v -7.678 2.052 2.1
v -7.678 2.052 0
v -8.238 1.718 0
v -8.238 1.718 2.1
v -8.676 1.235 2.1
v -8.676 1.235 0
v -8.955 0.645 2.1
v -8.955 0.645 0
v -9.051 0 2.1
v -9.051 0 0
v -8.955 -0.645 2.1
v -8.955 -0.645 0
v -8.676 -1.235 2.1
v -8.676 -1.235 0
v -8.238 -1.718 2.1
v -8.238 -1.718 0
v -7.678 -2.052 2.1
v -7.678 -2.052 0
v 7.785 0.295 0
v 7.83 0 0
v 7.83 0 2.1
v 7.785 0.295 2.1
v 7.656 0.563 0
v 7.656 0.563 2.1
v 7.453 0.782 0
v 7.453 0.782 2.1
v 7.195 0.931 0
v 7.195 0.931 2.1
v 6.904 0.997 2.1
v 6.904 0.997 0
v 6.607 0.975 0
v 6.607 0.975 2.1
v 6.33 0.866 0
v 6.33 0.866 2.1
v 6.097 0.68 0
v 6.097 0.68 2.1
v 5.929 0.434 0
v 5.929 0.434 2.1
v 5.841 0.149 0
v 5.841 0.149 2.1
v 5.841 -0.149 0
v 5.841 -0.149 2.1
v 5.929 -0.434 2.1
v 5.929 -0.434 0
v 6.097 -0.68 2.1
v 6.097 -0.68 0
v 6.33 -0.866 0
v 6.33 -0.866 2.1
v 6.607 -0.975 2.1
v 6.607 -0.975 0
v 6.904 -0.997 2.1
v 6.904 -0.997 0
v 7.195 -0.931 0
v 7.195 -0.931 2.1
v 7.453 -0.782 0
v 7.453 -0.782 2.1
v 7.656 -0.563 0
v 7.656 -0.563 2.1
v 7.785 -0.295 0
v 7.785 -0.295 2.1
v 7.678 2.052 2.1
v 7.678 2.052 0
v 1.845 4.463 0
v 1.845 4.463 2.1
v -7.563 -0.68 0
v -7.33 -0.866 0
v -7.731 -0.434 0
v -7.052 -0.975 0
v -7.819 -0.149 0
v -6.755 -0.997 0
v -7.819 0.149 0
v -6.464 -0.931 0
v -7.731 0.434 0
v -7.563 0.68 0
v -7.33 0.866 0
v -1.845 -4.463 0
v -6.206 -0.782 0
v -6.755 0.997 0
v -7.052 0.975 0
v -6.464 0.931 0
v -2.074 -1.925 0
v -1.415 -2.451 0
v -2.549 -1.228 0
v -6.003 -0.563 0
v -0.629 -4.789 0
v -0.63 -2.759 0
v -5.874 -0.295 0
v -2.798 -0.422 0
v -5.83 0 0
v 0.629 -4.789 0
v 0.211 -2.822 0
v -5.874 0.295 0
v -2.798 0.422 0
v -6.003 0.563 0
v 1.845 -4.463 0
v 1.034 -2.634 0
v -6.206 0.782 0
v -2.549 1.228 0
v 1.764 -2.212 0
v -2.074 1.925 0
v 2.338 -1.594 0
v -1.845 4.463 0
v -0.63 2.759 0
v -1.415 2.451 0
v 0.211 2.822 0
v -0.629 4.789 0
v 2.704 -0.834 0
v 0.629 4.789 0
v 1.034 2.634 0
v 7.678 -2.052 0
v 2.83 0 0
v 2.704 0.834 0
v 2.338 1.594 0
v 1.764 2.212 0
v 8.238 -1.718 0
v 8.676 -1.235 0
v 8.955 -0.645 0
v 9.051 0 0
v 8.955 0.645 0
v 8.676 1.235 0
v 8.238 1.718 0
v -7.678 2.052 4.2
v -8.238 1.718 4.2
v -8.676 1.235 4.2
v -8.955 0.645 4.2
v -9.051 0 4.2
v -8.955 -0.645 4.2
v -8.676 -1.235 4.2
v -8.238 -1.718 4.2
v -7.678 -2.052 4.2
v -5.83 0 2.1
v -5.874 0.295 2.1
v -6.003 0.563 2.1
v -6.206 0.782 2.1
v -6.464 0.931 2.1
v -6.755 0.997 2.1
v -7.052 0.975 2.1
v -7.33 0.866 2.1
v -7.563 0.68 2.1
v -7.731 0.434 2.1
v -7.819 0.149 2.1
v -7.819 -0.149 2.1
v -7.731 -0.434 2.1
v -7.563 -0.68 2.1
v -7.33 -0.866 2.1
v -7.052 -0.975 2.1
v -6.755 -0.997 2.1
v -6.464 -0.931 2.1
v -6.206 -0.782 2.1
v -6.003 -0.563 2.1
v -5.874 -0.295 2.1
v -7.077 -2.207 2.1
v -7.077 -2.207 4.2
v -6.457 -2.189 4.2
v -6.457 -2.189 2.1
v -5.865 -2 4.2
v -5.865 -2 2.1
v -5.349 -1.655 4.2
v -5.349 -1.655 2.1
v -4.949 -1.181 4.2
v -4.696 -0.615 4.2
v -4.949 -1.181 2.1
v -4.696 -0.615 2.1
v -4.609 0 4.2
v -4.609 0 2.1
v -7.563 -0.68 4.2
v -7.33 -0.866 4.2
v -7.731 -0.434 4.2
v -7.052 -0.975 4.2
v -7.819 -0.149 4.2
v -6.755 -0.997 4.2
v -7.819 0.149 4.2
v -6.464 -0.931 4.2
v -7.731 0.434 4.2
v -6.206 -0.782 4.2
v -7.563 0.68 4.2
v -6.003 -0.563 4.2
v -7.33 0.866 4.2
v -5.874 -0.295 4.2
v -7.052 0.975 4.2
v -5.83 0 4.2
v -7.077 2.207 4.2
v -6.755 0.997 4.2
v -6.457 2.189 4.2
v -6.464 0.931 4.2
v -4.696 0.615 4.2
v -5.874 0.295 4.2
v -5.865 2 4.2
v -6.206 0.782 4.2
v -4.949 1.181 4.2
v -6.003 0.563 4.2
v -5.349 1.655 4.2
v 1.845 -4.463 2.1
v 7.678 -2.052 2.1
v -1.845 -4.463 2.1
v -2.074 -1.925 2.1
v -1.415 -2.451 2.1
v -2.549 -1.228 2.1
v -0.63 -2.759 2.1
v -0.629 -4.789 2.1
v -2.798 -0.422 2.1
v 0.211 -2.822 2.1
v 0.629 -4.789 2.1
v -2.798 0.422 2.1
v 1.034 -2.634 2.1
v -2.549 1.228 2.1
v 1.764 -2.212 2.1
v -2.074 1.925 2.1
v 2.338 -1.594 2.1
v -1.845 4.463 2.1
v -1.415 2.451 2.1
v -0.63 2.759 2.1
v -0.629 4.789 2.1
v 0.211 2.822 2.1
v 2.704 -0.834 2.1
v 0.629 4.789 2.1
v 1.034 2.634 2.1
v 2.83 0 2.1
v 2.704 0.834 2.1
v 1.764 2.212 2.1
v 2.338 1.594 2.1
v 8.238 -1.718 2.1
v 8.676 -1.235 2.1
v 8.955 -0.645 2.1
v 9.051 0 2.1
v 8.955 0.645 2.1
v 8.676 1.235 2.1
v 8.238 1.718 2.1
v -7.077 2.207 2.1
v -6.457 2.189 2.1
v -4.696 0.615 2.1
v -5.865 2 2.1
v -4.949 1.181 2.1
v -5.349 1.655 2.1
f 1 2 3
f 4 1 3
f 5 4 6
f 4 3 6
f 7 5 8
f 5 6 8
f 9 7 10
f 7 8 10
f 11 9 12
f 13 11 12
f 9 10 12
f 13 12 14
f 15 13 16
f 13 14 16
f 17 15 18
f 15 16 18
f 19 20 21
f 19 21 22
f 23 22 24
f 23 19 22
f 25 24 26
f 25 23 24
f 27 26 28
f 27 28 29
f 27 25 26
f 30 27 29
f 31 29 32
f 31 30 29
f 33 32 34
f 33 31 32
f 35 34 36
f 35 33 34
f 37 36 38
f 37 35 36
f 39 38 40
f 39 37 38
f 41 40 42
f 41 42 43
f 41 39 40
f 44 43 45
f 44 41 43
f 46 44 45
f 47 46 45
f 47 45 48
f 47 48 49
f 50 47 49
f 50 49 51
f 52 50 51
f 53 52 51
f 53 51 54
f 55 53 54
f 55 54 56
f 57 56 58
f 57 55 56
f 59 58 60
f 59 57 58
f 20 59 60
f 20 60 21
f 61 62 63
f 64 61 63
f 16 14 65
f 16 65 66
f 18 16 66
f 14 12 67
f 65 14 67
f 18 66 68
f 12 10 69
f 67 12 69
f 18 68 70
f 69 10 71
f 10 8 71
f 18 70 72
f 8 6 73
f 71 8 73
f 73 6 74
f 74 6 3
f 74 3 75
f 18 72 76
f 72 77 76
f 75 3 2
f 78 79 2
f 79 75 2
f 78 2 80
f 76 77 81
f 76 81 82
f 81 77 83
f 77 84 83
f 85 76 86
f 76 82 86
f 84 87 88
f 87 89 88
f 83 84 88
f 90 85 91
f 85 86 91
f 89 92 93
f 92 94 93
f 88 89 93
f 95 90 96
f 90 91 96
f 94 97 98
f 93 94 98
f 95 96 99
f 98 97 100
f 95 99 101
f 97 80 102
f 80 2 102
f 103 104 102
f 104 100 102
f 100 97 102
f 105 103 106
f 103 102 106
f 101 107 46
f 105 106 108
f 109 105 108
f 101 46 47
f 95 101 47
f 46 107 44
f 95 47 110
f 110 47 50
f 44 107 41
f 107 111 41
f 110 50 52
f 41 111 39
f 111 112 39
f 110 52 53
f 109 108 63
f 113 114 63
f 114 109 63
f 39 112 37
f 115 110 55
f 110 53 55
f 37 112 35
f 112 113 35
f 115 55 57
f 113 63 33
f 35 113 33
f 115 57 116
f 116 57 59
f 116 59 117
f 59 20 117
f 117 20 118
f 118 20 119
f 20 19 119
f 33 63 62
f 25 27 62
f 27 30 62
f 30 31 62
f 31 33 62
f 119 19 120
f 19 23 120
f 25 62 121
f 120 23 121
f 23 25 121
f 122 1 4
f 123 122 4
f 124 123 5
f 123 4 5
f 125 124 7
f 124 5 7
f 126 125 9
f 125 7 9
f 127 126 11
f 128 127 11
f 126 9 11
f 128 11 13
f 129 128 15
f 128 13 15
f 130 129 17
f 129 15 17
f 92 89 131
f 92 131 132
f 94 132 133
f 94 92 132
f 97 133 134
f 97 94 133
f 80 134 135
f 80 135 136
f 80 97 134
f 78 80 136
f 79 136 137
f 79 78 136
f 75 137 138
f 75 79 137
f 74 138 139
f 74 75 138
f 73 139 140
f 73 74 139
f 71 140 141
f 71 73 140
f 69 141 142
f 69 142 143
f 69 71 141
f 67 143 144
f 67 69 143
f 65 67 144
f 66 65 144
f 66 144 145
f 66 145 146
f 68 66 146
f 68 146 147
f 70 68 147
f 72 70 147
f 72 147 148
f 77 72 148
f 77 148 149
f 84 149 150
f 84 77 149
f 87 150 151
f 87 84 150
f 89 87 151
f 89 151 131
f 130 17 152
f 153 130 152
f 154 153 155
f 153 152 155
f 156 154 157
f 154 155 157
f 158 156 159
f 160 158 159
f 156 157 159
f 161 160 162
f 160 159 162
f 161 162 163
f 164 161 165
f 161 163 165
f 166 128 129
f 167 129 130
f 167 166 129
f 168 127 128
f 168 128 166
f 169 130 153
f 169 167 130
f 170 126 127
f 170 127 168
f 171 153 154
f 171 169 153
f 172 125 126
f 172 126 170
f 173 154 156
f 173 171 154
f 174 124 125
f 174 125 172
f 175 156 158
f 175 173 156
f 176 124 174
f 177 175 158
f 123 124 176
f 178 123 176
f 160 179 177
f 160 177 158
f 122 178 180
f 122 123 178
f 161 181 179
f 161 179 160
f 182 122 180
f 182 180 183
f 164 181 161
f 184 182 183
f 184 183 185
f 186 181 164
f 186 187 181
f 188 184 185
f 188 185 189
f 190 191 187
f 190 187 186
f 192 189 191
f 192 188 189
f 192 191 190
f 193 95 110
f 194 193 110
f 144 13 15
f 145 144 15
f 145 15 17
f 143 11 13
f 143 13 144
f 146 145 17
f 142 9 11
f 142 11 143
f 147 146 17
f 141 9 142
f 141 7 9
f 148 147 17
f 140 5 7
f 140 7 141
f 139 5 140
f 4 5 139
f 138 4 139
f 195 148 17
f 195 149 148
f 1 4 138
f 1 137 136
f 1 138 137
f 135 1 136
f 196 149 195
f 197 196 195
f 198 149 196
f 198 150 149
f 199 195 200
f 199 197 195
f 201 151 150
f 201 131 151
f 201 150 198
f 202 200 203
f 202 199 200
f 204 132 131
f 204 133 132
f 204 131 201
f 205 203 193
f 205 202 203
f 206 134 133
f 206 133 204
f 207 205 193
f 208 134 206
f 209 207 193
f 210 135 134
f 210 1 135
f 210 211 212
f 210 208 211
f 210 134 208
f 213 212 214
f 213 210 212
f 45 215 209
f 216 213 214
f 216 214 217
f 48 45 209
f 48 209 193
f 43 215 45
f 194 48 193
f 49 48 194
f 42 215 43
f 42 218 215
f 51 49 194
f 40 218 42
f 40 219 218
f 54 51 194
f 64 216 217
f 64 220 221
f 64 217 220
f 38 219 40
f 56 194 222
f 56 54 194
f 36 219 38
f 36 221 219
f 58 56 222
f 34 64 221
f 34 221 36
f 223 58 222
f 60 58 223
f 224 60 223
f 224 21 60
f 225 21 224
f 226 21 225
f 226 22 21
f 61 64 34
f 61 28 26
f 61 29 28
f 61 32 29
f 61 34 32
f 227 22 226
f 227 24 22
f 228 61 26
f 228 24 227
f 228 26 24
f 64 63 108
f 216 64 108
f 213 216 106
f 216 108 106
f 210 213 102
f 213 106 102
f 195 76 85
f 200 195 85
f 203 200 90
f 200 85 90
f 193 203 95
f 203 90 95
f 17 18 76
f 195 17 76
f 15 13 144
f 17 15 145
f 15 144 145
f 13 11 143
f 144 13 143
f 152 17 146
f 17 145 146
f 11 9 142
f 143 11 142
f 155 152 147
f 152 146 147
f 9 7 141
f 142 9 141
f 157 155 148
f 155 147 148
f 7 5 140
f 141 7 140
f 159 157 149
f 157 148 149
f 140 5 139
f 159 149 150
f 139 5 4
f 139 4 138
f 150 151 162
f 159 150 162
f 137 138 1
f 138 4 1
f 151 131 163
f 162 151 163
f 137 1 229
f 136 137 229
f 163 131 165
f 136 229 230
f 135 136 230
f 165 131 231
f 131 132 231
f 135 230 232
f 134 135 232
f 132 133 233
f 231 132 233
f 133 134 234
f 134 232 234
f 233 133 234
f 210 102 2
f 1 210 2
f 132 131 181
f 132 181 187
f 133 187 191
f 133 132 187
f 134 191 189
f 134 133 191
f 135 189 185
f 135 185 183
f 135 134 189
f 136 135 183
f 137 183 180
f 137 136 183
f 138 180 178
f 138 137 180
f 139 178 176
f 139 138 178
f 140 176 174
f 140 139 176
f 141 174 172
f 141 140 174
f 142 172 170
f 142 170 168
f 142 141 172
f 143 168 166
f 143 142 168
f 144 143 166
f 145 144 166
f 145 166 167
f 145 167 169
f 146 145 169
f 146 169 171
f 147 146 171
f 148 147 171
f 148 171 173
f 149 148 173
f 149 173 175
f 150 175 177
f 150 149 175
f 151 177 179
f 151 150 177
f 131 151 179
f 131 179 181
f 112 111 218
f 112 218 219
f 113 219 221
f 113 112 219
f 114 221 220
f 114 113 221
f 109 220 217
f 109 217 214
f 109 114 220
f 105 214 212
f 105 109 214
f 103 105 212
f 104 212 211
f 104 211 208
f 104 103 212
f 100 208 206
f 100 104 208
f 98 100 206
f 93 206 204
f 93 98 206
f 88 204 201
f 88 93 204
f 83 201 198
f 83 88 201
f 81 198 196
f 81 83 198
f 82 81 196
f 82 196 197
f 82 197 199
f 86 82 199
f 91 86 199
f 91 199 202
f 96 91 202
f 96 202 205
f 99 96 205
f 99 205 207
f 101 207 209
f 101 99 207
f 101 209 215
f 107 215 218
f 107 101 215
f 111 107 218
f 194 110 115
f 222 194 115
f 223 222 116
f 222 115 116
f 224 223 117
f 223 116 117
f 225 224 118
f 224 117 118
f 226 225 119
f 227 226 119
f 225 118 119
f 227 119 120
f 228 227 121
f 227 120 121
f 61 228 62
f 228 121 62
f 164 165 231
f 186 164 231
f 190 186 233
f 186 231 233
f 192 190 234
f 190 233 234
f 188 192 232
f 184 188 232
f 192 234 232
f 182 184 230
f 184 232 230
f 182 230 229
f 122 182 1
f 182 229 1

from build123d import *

# Parameters (mm, degrees)
F0_R     = 1
F0_R_2   = 2.829688
F1_DEPTH = 2.1
F2_R     = 1
F3_DEPTH = 2.1


with BuildPart() as f1:
    # F0 (on Top) → F1 (new body)
    with BuildSketch(Plane.XY):
        with BuildLine():
            Line((-1.84489, 4.463436), (-7.678017, 2.052406))
            ThreePointArc((-7.678017, 2.052406), (-9.050505, 0), (-7.678017, -2.052406))
            Line((-7.678017, -2.052406), (-1.84489, -4.463436))
            ThreePointArc((-1.84489, -4.463436), (0, -4.829688), (1.84489, -4.463436))
            Line((1.84489, -4.463436), (7.678017, -2.052406))
            ThreePointArc((7.678017, -2.052406), (9.050505, 0), (7.678017, 2.052406))
            Line((7.678017, 2.052406), (1.84489, 4.463436))
            ThreePointArc((1.84489, 4.463436), (0, 4.829687), (-1.84489, 4.463436))
        make_face()
        with Locations((-6.829688, 0)):
            Circle(F0_R, mode=Mode.SUBTRACT)
        Circle(F0_R_2, mode=Mode.SUBTRACT)
        with Locations((6.829688, 0)):
            Circle(F0_R, mode=Mode.SUBTRACT)
    extrude(amount=F1_DEPTH)


with BuildPart() as f3:
    # F2 (on face) → F3 (new body)
    with BuildSketch(Plane.XY.offset(2.1)):
        with BuildLine():
            ThreePointArc((-7.678017, -2.052406), (-5.595174, -1.846079), (-4.60887, 0))
            ThreePointArc((-4.60887, 0), (-5.595174, 1.846079), (-7.678017, 2.052406))
            ThreePointArc((-7.678017, 2.052406), (-9.050505, 0), (-7.678017, -2.052406))
        make_face()
        with Locations((-6.829688, 0)):
            Circle(F2_R, mode=Mode.SUBTRACT)
    extrude(amount=F3_DEPTH)


solid = Compound([f1.part, f3.part])
